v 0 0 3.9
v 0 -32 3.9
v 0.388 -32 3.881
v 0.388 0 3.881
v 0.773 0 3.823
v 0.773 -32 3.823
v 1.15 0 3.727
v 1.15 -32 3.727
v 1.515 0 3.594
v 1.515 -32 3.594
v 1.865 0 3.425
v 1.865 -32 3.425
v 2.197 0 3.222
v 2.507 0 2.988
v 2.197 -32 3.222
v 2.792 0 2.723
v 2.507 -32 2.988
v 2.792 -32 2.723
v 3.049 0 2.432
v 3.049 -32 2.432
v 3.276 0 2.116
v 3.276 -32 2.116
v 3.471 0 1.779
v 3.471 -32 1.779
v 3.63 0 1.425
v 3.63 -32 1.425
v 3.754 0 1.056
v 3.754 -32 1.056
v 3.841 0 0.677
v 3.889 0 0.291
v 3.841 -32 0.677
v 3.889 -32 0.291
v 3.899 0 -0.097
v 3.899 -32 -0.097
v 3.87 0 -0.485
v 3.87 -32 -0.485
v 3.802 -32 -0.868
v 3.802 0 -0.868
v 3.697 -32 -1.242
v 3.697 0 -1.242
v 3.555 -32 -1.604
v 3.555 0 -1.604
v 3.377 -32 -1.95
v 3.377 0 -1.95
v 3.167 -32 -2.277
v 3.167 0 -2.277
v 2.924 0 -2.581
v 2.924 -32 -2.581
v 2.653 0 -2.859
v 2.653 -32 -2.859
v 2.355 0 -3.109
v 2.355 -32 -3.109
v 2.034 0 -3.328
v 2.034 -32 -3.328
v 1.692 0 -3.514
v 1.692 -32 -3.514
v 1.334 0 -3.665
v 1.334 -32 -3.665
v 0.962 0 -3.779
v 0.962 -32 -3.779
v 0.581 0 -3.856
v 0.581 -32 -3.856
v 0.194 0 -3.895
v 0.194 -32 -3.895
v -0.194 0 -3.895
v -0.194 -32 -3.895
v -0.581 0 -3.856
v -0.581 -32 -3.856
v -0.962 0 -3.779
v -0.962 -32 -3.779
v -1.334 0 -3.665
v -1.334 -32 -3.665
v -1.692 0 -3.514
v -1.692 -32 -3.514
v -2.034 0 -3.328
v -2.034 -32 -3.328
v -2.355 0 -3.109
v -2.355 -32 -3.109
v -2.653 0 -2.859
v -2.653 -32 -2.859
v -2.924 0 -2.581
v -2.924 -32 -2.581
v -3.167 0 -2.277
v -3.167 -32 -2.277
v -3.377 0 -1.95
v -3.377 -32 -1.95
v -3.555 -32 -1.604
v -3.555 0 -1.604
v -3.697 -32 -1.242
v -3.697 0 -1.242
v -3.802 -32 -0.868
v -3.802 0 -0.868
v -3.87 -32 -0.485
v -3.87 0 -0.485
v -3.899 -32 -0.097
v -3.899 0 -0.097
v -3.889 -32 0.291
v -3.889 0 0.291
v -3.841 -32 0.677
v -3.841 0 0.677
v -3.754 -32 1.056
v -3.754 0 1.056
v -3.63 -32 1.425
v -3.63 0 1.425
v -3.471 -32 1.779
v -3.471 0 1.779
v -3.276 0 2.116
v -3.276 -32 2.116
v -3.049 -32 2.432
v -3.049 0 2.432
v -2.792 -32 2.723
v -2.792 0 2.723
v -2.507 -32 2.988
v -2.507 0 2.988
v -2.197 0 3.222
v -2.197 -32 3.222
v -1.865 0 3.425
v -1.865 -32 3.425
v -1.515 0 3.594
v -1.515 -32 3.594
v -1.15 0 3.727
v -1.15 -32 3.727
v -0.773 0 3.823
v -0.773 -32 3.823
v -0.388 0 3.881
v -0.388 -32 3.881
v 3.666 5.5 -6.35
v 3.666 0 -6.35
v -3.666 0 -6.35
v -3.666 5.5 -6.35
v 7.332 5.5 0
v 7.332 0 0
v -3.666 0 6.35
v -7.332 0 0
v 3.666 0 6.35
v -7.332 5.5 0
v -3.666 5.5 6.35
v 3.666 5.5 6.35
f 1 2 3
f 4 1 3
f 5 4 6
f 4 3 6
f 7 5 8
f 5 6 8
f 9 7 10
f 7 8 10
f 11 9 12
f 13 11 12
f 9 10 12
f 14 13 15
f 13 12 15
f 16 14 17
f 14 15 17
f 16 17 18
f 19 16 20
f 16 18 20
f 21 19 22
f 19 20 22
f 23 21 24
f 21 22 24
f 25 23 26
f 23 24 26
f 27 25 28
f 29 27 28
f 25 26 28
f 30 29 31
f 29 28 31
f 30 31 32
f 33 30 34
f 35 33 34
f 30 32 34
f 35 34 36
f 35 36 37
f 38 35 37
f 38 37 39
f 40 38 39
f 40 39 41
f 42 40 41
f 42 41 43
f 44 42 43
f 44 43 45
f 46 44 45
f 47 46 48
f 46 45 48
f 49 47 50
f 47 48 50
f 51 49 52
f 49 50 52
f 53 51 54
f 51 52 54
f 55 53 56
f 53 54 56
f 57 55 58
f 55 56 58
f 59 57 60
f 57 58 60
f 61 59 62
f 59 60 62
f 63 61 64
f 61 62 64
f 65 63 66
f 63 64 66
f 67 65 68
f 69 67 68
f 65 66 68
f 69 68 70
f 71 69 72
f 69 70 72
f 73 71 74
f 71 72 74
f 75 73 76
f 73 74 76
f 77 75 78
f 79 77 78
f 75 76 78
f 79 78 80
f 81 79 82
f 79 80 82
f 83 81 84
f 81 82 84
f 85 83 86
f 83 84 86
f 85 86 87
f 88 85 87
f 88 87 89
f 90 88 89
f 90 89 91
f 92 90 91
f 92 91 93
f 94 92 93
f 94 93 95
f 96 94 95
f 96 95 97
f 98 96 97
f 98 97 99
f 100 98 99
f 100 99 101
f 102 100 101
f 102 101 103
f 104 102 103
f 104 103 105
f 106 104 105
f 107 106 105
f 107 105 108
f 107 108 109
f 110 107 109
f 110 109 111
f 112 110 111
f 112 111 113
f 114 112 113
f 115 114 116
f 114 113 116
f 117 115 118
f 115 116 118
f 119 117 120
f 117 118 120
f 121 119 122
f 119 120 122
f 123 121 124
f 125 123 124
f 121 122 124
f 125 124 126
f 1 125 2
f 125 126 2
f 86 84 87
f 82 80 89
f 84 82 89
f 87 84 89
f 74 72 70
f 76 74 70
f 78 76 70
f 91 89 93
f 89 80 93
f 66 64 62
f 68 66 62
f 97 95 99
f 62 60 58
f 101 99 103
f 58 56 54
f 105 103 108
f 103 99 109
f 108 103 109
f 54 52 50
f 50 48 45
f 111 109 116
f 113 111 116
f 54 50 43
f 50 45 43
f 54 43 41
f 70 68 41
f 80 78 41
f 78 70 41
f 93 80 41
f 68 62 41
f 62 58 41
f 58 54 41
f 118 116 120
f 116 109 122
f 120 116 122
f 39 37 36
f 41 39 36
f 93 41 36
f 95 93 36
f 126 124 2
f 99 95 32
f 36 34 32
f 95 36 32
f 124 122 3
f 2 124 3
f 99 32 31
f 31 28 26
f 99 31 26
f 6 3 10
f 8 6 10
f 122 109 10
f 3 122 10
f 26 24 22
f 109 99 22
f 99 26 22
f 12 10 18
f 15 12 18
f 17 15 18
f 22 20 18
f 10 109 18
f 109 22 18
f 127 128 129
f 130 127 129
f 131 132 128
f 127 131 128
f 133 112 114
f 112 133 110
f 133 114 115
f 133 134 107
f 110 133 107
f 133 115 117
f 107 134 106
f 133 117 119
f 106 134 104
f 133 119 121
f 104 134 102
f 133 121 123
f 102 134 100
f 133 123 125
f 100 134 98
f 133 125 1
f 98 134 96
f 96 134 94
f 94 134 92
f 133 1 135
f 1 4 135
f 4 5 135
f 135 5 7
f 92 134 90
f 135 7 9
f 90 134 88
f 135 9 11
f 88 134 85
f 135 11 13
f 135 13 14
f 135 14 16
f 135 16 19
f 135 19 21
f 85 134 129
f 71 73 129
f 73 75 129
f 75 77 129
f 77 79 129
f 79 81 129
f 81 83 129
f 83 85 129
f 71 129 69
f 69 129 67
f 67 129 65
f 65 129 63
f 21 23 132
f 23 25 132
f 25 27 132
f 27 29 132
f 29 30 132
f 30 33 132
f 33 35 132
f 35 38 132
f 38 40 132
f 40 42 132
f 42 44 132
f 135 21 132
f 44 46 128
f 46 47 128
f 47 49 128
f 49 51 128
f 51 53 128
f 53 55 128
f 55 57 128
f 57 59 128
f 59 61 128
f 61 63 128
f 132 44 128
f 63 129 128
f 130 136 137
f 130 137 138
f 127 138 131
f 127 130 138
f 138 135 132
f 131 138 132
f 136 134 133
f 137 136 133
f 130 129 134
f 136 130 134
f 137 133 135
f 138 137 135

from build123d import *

# Parameters (mm, degrees)
BOSS_EXTRUDE1_DEPTH = 5.5
BOSS_EXTRUDE2_START = -32
SKETCH2_R           = 3.9
BOSS_EXTRUDE2_DEPTH = 32


with BuildPart() as part:
    # Sketch1 → Boss-Extrude1 (new body)
    with BuildSketch(Plane(origin=(0, 0, 0), x_dir=(1, 0, 0), z_dir=(0, 1, 0))):
        Polygon((7.332348419, 0), (3.666174209, 6.35), (-3.666174209, 6.35), (-7.332348419, 0), (-3.666174209, -6.35), (3.666174209, -6.35), align=None)
    extrude(amount=BOSS_EXTRUDE1_DEPTH)

    # Sketch2 → Boss-Extrude2 (add)
    with BuildSketch(Plane(origin=(0, 0, 0), x_dir=(1, 0, 0), z_dir=(0, 1, 0)).offset(BOSS_EXTRUDE2_START)):
        with Locations(Location((0, 0, 0), (0, 0, 270))):
            Circle(SKETCH2_R)
    extrude(amount=BOSS_EXTRUDE2_DEPTH)


solid = part.part
